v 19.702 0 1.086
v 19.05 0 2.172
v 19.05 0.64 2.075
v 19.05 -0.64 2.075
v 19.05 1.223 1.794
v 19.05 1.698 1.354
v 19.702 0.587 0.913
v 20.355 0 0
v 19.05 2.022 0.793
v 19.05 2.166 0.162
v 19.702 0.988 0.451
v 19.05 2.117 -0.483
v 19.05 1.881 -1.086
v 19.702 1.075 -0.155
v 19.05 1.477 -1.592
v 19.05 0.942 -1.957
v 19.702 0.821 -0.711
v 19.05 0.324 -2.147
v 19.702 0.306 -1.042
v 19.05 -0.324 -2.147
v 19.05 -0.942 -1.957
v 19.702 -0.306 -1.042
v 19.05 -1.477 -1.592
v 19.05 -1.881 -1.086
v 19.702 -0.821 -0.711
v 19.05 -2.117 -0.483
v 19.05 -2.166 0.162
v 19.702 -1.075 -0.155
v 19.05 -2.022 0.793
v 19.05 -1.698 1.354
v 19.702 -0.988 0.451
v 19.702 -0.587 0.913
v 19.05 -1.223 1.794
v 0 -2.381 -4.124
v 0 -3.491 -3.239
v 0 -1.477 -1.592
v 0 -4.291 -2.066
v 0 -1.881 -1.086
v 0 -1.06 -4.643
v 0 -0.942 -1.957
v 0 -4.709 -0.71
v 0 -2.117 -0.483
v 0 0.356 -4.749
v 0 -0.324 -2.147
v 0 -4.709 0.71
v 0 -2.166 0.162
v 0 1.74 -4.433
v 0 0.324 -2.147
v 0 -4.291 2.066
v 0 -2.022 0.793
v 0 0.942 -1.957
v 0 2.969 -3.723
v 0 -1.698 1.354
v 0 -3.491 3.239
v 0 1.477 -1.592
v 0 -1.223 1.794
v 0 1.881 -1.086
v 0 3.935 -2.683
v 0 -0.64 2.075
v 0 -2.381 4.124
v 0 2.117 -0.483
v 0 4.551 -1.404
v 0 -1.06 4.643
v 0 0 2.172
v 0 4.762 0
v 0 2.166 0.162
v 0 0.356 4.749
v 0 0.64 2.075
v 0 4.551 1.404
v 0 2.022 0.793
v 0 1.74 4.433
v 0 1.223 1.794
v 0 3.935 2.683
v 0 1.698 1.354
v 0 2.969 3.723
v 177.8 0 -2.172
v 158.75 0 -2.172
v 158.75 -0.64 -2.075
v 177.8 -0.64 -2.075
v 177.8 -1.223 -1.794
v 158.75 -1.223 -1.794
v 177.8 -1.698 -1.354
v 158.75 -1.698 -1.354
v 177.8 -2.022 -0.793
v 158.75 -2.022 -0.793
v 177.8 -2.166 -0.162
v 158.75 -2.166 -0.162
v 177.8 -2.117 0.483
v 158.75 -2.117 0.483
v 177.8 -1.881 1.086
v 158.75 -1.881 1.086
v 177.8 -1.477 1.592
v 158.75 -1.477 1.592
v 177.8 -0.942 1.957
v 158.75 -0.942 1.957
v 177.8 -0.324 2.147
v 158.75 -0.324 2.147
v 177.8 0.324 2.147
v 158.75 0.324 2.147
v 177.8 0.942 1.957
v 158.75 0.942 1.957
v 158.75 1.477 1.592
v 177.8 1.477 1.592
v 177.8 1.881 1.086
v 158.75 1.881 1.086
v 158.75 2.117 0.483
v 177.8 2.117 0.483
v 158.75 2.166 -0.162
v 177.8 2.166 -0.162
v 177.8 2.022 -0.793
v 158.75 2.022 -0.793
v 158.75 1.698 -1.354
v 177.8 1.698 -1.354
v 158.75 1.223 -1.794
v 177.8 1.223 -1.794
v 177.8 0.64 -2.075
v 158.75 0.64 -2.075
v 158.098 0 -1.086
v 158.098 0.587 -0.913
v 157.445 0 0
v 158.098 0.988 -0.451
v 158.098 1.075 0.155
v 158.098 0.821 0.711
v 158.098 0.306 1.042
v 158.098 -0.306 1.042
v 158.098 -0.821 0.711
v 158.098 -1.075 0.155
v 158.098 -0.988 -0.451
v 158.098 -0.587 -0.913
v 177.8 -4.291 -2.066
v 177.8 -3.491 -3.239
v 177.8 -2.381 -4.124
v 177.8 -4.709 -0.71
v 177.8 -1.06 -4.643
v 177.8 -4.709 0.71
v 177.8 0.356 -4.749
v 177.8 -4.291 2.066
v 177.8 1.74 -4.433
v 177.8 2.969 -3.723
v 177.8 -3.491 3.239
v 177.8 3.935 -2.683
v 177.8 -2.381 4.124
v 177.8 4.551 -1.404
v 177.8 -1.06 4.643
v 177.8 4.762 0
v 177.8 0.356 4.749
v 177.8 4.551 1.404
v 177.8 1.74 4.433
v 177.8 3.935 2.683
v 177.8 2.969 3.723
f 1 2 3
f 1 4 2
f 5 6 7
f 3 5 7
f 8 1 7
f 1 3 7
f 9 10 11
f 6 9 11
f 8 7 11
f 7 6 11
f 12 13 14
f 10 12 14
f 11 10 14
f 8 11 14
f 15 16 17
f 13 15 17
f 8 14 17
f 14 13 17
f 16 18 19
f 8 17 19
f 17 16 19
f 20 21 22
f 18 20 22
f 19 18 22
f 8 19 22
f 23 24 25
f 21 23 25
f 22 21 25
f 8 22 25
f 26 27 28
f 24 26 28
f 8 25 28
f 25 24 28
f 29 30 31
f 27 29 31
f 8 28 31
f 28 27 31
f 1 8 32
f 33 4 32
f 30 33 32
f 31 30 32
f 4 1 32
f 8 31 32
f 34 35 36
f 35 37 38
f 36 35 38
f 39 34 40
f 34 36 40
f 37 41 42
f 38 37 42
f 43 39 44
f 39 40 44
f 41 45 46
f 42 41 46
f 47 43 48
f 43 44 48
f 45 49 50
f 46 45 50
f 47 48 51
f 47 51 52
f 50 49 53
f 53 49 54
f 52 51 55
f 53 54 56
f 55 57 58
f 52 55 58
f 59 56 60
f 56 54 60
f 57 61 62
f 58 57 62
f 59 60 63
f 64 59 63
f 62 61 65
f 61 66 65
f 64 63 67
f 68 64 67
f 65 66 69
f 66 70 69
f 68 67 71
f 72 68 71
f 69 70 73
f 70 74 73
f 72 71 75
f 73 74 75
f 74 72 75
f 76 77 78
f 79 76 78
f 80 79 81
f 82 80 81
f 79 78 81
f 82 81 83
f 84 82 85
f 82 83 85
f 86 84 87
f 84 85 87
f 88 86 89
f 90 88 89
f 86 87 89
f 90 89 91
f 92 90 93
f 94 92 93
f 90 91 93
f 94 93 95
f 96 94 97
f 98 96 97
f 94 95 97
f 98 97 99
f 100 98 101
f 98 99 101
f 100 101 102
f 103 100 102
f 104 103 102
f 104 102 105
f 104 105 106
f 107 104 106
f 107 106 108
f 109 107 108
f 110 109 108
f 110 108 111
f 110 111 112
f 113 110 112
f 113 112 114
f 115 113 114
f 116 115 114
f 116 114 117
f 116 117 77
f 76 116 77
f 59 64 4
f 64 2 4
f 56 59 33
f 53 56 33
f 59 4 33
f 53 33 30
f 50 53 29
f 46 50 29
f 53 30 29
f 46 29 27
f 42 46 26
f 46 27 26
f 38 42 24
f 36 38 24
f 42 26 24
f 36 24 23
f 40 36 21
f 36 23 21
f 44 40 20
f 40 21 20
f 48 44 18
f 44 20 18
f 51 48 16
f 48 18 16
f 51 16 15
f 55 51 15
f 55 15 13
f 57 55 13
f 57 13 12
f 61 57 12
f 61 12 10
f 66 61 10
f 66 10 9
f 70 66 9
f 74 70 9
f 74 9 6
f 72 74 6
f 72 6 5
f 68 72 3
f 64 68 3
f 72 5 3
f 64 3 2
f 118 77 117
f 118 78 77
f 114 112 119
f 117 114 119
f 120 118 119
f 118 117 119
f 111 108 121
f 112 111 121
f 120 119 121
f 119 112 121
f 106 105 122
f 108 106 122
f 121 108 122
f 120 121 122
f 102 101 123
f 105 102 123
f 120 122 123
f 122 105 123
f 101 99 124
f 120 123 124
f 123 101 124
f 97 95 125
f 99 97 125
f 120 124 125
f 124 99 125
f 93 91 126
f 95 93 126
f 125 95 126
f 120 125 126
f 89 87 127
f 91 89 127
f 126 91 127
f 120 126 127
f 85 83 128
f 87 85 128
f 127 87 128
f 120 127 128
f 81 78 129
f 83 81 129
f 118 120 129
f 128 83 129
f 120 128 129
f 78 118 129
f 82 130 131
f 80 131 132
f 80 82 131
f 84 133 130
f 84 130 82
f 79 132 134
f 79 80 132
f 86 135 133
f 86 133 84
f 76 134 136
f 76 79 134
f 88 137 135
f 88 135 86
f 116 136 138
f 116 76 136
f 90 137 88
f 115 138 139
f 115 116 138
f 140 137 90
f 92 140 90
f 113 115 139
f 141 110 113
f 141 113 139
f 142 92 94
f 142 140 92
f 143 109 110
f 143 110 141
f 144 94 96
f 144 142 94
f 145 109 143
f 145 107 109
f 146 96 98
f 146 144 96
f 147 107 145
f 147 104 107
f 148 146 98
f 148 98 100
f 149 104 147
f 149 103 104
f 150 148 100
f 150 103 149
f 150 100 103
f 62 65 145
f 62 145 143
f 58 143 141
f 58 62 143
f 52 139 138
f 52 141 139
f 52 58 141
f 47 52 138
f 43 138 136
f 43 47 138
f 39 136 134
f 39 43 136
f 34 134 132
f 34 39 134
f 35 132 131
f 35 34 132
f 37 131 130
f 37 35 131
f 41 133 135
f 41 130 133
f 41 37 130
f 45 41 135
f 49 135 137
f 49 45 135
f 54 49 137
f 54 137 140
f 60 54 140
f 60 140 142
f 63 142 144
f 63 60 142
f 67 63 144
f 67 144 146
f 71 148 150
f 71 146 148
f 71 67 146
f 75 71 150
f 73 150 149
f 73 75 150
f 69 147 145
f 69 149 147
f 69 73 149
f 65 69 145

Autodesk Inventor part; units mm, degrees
ref_plane "YZ Plane" through (0, 0, 0) normal (1, 0, 0) x (0, 1, 0)
ref_plane "XZ Plane" through (0, 0, 0) normal (0, 1, 0) x (-1, 0, 0)
ref_plane "XY Plane" through (0, 0, 0) normal (0, 0, 1) x (1, 0, 0)
sketch "Sketch1" plane through (0, 0, 0) normal (1, 0, 0) x (0, 1, 0)
  circle A0 centre (0, 0) radius 4.7625
  dimension "d0" = 9.525
extrude "Extrusion1" add sketch "Sketch1" along normal blind 177.8
sketch "Sketch2" plane through (177.8, 0, 0) normal (1, 0, 0) x (0, 0, -1)
  circle A0 centre (0, 0) radius 4.7625 projected
hole "Hole1" at (177.8, 0, 0) direction (-1, 0, 0) diameter 4.3434 depth 19.05 tip angle 118 thread size "12-24 UNC" class "2B" standard "ANSI Unified Screw Threads"
sketch "Sketch3" plane through (0, 0, 0) normal (-1, 0, 0) x (0, 0, 1)
  circle A0 centre (0, 0) radius 2.1717 projected
hole "Hole2" at (0, 0, 0) direction (1, 0, 0) diameter 4.3434 depth 19.05 tip angle 118 thread size "12-24 UNC" class "2B" standard "ANSI Unified Screw Threads"
properties part number "STOCK,HOOD,SPACER,10-32,6.25in" material "Aluminum 6061"
